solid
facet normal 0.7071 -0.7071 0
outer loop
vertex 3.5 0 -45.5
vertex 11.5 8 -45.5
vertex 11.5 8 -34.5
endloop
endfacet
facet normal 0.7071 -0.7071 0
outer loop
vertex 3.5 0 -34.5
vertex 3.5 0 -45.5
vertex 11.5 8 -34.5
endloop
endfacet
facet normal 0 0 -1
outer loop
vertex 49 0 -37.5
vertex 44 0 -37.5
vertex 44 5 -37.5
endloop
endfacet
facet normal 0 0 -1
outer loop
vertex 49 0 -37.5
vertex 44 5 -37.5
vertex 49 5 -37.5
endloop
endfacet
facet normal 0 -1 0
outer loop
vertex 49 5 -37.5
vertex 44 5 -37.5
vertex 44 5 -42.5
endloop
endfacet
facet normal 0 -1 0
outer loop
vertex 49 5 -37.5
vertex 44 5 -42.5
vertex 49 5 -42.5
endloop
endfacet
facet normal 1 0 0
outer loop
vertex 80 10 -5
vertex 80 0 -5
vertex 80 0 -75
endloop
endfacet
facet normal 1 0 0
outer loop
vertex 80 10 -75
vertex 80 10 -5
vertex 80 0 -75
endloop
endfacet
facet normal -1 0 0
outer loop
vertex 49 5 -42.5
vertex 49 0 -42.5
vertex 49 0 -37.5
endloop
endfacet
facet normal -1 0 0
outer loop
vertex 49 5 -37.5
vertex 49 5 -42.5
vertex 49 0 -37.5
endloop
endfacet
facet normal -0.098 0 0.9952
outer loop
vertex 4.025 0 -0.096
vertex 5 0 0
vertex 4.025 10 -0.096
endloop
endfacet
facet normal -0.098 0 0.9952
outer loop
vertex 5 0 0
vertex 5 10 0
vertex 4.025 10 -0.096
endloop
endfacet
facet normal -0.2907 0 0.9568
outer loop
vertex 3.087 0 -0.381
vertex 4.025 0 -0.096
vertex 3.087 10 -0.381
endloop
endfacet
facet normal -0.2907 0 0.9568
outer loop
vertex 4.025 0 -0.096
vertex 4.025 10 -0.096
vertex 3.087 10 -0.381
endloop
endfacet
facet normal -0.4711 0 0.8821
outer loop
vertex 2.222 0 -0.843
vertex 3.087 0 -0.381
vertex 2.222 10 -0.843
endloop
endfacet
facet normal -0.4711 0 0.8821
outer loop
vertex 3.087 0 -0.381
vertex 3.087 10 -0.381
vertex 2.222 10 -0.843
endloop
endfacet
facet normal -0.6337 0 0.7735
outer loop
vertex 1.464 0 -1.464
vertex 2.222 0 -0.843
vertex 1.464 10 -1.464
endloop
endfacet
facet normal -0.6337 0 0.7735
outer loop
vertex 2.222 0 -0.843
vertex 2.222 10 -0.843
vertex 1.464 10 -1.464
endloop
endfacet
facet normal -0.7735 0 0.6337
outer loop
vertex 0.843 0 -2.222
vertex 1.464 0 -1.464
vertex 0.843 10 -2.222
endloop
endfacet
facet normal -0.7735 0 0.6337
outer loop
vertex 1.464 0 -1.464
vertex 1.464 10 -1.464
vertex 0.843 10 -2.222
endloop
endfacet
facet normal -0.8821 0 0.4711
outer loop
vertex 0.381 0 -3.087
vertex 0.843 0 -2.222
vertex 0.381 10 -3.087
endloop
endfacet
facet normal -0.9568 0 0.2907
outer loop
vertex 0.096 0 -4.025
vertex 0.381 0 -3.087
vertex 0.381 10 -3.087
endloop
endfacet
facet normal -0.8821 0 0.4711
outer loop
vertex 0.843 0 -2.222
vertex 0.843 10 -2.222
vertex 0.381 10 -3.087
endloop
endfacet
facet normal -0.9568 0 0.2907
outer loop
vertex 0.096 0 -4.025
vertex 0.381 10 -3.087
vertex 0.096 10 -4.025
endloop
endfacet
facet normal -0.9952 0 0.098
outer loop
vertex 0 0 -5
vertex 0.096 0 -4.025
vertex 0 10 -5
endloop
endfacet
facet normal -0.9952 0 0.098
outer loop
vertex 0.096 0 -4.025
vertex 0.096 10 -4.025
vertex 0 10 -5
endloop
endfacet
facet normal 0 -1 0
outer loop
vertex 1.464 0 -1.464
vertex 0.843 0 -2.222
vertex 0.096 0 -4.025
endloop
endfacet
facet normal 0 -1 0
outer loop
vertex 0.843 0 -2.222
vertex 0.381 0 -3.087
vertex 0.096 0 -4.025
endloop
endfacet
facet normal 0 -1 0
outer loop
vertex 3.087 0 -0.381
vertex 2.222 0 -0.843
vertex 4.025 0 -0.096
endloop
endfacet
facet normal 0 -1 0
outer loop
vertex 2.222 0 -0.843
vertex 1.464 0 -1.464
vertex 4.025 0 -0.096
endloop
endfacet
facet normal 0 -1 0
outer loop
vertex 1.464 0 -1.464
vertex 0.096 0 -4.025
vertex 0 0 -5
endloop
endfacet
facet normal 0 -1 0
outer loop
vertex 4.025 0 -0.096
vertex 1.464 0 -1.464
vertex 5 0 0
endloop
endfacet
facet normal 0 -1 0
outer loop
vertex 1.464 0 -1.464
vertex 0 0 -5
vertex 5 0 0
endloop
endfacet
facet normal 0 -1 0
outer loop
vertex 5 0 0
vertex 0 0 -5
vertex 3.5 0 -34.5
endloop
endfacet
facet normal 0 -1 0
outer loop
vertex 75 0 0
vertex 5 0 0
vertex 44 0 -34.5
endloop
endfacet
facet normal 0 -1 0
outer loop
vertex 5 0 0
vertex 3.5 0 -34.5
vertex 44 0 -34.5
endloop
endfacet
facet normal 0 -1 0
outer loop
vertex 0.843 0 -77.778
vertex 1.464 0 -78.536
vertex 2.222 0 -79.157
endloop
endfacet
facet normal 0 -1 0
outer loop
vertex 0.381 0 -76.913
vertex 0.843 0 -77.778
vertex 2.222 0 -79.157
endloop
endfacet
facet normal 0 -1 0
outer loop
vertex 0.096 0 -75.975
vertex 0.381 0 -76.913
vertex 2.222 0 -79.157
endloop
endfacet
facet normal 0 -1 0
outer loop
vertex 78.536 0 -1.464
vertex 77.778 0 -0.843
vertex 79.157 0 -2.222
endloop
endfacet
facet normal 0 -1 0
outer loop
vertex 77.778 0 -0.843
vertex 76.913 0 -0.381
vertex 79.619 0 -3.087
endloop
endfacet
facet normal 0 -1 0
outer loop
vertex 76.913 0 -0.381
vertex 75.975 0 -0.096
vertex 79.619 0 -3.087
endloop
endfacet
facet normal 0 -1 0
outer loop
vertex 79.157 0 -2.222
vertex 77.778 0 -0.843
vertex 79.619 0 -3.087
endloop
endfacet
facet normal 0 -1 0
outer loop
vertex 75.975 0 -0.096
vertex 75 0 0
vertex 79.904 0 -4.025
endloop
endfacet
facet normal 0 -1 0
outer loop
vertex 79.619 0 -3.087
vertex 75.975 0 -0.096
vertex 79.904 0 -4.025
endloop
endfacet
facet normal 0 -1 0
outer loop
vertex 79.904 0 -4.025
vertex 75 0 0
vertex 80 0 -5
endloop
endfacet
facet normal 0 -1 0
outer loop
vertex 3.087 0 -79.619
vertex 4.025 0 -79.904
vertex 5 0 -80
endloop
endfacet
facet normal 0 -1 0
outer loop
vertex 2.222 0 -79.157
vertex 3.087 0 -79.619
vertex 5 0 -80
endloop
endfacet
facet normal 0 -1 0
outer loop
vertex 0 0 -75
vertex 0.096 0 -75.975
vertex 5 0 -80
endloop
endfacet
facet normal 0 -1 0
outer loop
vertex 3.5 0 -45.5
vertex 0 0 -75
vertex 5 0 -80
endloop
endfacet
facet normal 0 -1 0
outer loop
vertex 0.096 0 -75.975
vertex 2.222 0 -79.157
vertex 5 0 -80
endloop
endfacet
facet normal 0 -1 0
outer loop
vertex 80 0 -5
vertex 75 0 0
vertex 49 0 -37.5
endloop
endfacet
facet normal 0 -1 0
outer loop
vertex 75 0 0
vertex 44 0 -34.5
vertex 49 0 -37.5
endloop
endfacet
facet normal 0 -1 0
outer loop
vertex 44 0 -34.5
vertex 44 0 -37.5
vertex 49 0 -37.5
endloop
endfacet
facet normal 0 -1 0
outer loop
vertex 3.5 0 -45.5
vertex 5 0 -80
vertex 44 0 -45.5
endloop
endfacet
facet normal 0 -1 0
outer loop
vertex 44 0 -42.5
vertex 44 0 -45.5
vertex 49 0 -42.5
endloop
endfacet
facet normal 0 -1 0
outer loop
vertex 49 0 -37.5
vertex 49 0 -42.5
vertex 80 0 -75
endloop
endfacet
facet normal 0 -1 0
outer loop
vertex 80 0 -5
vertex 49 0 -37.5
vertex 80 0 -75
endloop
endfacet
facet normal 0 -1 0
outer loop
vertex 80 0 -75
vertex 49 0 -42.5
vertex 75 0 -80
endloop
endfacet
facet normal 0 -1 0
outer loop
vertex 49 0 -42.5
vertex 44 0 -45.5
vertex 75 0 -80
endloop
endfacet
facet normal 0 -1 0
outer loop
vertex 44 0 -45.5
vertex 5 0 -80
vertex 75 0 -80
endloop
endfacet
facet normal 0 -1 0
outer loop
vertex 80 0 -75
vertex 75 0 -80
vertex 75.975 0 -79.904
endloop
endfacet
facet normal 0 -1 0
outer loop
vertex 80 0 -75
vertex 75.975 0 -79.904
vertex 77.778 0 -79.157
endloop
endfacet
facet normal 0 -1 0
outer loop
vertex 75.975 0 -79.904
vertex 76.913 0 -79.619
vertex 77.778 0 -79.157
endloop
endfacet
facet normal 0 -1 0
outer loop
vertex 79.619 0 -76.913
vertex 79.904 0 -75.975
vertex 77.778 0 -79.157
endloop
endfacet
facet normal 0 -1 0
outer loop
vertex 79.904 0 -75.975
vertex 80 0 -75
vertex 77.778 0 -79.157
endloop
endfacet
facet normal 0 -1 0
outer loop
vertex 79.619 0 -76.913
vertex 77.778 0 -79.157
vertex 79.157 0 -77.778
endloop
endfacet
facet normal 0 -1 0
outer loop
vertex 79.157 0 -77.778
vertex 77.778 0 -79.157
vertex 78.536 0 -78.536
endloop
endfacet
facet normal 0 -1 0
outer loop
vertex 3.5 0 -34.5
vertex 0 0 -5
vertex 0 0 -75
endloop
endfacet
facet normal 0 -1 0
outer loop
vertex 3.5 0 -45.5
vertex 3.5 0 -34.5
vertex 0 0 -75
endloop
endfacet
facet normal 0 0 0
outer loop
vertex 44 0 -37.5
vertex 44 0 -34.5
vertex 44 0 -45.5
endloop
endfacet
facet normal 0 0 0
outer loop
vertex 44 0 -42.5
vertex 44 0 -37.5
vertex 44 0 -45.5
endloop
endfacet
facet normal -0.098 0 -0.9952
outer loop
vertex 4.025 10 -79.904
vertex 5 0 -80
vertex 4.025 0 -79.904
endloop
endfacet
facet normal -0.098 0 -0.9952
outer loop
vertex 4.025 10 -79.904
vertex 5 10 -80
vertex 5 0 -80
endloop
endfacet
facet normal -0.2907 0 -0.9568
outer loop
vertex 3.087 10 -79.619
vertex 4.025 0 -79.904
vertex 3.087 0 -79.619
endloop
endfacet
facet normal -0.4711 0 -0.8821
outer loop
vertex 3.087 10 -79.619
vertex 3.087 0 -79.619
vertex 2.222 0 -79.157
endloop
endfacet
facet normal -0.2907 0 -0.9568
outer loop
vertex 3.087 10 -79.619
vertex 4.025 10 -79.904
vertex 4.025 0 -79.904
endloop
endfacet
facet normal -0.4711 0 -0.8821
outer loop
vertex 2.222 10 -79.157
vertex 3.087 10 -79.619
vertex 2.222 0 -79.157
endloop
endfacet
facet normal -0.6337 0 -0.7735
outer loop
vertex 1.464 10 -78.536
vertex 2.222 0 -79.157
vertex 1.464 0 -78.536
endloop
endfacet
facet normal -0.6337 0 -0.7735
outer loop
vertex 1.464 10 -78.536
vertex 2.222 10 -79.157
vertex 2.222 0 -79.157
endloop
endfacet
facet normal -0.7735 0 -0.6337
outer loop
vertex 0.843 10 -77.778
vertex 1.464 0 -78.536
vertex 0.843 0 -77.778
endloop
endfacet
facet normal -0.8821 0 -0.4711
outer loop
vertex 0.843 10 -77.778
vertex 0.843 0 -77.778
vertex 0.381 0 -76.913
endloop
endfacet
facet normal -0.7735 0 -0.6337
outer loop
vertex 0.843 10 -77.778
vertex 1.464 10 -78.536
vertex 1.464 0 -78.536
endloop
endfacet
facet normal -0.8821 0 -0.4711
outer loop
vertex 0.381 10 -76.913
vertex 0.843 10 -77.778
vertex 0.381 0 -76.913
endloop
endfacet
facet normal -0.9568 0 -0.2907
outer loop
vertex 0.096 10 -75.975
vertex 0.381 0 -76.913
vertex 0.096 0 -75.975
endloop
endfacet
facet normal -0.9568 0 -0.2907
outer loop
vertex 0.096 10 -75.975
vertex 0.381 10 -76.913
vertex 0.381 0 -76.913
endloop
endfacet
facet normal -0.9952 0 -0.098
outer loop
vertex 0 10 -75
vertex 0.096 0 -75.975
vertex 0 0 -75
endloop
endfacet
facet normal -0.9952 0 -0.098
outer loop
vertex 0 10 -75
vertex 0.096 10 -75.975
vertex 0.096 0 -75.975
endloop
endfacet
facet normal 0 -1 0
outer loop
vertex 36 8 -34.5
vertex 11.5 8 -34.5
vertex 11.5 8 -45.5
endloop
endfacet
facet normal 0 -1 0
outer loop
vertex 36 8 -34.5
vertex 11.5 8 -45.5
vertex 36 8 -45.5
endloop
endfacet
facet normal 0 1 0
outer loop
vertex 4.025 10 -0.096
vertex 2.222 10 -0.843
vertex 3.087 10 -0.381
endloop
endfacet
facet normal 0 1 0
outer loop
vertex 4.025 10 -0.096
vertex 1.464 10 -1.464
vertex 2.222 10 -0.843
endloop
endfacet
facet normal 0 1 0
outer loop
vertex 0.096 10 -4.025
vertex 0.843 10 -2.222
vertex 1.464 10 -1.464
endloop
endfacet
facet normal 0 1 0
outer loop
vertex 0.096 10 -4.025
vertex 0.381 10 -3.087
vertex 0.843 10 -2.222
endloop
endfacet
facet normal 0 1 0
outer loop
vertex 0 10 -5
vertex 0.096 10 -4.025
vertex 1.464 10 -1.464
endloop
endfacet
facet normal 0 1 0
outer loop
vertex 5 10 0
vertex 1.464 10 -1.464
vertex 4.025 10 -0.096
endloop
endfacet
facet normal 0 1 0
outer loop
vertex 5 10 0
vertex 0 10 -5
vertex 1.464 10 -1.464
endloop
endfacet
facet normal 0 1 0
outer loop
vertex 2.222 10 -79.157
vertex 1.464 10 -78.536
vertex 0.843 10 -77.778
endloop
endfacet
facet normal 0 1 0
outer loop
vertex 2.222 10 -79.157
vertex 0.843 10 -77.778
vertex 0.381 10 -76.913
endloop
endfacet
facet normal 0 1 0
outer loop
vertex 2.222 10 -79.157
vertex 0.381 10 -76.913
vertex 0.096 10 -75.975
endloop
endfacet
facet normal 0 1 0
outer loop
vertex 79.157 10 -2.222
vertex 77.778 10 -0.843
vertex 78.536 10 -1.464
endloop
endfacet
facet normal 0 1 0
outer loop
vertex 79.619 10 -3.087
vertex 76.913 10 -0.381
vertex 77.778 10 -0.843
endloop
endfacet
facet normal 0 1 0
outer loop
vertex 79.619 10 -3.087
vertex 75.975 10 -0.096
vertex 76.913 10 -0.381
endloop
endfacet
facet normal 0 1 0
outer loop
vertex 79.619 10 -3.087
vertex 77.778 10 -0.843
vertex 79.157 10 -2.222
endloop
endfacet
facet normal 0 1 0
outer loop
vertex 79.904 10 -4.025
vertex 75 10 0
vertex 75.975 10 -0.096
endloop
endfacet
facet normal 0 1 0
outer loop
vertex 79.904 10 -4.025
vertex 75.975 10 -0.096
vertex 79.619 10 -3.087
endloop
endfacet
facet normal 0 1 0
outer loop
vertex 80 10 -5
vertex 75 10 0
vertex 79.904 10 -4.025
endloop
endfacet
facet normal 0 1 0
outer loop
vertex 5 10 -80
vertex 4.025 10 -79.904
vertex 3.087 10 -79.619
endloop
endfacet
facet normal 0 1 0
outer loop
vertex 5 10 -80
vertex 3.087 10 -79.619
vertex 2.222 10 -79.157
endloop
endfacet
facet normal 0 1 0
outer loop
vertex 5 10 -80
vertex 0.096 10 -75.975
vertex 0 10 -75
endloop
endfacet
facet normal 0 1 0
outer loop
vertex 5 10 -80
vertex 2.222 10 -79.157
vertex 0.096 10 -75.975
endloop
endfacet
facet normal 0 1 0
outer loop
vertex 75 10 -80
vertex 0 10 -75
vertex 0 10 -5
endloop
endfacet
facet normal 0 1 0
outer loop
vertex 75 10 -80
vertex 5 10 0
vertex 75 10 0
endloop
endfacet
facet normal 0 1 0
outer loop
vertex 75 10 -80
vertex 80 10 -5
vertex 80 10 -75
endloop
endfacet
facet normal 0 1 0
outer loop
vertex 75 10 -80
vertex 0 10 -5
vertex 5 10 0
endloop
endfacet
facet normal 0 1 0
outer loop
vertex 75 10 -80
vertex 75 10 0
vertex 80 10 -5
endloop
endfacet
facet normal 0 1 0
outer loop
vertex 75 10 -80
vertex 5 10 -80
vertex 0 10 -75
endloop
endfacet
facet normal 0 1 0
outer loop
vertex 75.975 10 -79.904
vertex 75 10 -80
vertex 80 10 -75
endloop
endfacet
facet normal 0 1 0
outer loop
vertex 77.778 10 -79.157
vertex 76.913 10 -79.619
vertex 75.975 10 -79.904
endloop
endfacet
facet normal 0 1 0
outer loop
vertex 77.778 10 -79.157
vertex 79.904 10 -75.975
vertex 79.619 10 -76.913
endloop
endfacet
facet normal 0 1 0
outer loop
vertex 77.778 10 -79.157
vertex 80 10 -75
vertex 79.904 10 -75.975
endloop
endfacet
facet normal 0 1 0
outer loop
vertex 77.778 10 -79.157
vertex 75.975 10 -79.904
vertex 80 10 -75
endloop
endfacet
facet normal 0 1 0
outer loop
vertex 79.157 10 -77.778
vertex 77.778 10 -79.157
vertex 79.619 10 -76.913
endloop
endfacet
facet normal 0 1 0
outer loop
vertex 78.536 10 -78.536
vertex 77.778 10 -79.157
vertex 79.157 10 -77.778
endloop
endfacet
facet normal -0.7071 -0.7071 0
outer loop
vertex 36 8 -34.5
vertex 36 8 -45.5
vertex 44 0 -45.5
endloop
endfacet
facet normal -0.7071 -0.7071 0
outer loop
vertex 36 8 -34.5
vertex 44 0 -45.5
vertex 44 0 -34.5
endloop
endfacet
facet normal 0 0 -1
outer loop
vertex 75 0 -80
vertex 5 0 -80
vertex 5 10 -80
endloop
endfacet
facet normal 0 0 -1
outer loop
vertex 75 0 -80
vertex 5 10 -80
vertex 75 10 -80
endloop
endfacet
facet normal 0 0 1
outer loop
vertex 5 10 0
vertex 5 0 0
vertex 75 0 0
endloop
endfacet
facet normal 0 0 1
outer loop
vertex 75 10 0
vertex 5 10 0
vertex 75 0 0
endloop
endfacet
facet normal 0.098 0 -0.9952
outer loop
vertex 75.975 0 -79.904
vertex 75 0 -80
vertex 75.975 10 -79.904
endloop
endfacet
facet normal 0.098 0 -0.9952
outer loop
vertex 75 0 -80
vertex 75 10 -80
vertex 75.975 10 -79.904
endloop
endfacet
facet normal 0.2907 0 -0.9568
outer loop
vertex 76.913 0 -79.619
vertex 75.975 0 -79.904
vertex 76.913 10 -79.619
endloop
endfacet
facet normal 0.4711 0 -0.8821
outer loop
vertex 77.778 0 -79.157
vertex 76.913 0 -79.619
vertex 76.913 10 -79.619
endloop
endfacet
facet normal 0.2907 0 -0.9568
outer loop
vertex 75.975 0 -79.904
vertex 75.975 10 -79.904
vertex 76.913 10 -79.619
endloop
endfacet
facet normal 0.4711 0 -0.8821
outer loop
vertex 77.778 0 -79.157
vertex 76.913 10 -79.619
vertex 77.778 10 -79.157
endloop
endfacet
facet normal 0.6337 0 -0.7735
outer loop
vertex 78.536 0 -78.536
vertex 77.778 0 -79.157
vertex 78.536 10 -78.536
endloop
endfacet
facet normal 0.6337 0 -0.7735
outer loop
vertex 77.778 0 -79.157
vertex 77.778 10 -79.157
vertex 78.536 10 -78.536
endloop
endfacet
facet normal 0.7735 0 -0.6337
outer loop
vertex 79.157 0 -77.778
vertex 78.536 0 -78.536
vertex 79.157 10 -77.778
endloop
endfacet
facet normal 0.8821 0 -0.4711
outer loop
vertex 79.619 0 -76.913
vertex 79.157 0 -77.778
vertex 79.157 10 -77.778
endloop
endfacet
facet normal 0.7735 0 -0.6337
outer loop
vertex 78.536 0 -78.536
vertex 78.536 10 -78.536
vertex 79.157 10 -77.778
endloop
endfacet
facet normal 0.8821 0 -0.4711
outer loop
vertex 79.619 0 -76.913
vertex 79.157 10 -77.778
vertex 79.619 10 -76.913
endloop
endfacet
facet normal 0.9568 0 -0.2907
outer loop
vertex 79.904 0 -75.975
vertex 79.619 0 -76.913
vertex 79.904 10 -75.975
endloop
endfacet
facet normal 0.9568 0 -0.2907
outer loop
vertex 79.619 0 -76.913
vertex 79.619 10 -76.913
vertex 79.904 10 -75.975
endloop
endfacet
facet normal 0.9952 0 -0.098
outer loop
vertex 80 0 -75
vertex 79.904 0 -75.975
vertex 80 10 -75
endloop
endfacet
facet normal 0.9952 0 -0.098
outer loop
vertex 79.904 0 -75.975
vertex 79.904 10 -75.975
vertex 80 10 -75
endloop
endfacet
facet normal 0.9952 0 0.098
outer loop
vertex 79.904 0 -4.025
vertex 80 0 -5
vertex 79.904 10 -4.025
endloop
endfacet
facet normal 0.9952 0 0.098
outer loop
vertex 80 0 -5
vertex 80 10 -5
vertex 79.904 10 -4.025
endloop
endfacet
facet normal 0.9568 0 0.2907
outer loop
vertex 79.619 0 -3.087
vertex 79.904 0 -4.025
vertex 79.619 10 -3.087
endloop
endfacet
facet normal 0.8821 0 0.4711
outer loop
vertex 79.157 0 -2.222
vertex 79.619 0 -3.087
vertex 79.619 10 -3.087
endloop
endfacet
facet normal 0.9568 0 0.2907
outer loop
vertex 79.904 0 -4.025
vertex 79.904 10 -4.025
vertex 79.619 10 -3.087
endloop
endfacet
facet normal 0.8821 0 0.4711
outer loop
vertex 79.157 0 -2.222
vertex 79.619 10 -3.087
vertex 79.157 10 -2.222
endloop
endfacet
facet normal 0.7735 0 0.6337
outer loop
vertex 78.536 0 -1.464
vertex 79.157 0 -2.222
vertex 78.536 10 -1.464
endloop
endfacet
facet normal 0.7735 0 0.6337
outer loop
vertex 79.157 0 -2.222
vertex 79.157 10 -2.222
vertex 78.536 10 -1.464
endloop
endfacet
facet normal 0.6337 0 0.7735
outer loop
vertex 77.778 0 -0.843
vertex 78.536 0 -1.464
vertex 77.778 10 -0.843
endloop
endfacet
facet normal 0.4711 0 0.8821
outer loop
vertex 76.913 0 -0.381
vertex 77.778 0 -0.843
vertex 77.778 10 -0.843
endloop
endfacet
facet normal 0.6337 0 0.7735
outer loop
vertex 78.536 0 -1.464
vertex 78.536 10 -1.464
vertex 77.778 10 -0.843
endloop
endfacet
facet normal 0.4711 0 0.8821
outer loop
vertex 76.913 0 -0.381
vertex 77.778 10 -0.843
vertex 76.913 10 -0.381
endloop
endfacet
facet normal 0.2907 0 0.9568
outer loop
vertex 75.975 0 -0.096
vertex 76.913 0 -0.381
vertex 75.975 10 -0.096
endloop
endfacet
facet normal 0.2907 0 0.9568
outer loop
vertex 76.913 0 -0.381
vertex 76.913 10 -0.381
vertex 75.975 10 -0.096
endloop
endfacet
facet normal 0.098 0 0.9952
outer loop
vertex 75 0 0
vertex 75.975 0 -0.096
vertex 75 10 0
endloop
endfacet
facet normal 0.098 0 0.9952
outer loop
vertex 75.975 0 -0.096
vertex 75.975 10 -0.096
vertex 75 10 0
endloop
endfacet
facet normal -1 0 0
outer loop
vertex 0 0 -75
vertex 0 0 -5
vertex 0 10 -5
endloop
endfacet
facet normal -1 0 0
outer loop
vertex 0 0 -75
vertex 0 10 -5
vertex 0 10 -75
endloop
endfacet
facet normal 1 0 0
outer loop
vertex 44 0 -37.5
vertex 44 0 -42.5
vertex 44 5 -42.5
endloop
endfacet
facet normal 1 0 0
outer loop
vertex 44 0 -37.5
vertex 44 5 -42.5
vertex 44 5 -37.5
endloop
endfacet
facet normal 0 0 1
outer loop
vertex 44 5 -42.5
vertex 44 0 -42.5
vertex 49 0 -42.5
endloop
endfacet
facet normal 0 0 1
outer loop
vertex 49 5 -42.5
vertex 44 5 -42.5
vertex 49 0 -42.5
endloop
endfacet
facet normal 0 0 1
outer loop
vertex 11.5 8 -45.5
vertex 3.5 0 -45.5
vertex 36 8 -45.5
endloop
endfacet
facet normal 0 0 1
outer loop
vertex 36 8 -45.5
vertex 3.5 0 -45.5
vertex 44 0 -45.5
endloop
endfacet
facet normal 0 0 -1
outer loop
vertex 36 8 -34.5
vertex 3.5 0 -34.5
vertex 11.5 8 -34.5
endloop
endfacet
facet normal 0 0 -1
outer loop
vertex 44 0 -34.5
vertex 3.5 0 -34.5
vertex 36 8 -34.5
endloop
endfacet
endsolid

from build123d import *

# Parameters (mm, degrees)
ESQUISSE1_W             = 80
ESQUISSE1_H             = 80
EXTRUSION1_DEPTH        = 10
ESQUISSE2_W             = 24.5
ESQUISSE2_H             = 11
ENL_V_MAT_EXTRU_1_DEPTH = 8
CHANFREIN1_SIZE         = 8
CHANFREIN2_SIZE         = 8
CONG_1_R                = 5
ESQUISSE3_W             = 5
ESQUISSE3_H             = 5
ENL_V_MAT_EXTRU_2_DEPTH = 5


with BuildPart() as part:
    # Esquisse1 → Extrusion1 (new body)
    with BuildSketch(Plane(origin=(0, 0, 0), x_dir=(1, 0, 0), z_dir=(0, 1, 0))):
        with Locations((40, 40)):
            Rectangle(ESQUISSE1_W, ESQUISSE1_H)
    extrude(amount=EXTRUSION1_DEPTH)

    # Esquisse2 → Enlèv. mat.-Extru.1 (cut)
    with BuildSketch(Plane.XZ):
        with Locations((23.75, -40)):
            Rectangle(ESQUISSE2_W, ESQUISSE2_H)
    extrude(amount=-ENL_V_MAT_EXTRU_1_DEPTH, mode=Mode.SUBTRACT)

    # Chanfrein1
    chanfrein1_edges = [part.edges().sort_by_distance(p)[0] for p in [
        (11.5, 0, -40),
    ]]
    chamfer(chanfrein1_edges, length=CHANFREIN1_SIZE - 0.0001)  # a hair under: the kernel refuses the full size

    # Chanfrein2
    chanfrein2_edges = [part.edges().sort_by_distance(p)[0] for p in [
        (36, 0, -40),
    ]]
    chamfer(chanfrein2_edges, length=CHANFREIN2_SIZE - 0.0001)  # a hair under: the kernel refuses the full size

    # Congé1
    cong_1_edges = [part.edges().sort_by_distance(p)[0] for p in [
        (0, 5, -80),
        (80, 5, -80),
        (80, 5, 0),
        (0, 5, 0),
    ]]
    fillet(cong_1_edges, radius=CONG_1_R)

    # Esquisse3 → Enlèv. mat.-Extru.2 (cut)
    with BuildSketch(Plane.XZ):
        with Locations((46.5, -40)):
            Rectangle(ESQUISSE3_W, ESQUISSE3_H)
    extrude(amount=-ENL_V_MAT_EXTRU_2_DEPTH, mode=Mode.SUBTRACT)


solid = part.part
